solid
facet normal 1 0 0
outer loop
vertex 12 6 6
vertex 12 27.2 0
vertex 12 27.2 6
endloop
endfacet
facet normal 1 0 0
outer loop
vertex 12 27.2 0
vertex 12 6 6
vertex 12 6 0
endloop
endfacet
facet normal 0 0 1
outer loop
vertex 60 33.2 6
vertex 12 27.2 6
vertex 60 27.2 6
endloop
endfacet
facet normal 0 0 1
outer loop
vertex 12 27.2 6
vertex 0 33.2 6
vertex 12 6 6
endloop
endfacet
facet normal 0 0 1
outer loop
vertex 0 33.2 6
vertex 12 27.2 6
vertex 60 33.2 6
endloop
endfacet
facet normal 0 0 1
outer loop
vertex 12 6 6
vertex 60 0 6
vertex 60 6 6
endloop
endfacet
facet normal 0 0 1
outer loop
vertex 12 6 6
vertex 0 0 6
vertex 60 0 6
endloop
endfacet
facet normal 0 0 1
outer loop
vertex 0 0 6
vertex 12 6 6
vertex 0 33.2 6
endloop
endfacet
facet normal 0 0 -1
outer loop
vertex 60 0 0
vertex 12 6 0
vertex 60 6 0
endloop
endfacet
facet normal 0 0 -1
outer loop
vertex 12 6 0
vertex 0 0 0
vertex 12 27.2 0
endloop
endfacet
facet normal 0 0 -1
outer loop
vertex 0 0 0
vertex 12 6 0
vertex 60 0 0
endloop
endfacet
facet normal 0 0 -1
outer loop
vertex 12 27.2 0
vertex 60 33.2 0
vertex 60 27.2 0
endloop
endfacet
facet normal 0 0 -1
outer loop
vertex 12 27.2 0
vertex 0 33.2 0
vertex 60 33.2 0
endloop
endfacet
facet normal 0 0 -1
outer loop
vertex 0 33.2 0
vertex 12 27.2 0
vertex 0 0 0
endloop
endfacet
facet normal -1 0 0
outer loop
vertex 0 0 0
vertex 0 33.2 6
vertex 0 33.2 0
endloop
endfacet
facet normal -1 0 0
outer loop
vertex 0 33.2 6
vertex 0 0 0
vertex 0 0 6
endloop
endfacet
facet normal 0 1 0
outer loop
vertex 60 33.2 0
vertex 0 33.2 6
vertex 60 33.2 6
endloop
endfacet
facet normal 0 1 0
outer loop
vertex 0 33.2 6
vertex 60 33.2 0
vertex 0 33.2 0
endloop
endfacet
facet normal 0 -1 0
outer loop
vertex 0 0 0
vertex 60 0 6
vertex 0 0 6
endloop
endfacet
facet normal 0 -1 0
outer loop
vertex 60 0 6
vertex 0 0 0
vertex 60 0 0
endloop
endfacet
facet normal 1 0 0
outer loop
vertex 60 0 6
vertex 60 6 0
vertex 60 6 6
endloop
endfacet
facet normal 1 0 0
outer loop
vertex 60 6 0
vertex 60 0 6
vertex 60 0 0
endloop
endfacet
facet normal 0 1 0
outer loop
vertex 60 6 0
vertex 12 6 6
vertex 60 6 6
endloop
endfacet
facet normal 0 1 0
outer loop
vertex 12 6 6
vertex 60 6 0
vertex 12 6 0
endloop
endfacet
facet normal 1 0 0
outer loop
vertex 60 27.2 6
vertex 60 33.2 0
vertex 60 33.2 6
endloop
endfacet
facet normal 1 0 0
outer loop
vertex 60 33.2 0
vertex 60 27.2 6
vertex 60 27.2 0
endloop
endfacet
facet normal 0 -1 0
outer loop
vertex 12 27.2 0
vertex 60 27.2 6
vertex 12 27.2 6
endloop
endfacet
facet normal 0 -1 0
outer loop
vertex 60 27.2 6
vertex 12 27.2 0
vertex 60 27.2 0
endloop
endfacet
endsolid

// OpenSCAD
// QualityRelay 5.0 rebuilt print kit
// Units: millimeters
// Export one part at a time by changing `part`.
// slot_defect / tab_defect are seeded out-of-tolerance specimens that cannot fit any
// mating part in this kit (CAD interference >= 0.40 mm). They are intentional test
// specimens, not naturally occurring manufacturing defects.

part = "slot_good";

coupon_length = 60;
coupon_height = 6;
slot_base_length = 12;
slot_rail_width = 6;

module slot_coupon(inner_width) {
    outer_width = inner_width + 2 * slot_rail_width;
    union() {
        cube([slot_base_length, outer_width, coupon_height]);
        translate([slot_base_length, 0, 0])
            cube([coupon_length - slot_base_length, slot_rail_width, coupon_height]);
        translate([slot_base_length, slot_rail_width + inner_width, 0])
            cube([coupon_length - slot_base_length, slot_rail_width, coupon_height]);
    }
}

module tab_coupon(width) {
    cube([coupon_length, width, coupon_height]);
}

if (part == "slot_good") {
    slot_coupon(21.20);
} else if (part == "slot_nominal") {
    slot_coupon(21.00);
} else if (part == "slot_risk") {
    slot_coupon(20.70);
} else if (part == "tab_good") {
    tab_coupon(19.80);
} else if (part == "tab_nominal") {
    tab_coupon(20.00);
} else if (part == "tab_risk") {
    tab_coupon(20.30);
} else if (part == "slot_defect") {
    slot_coupon(19.40);
} else if (part == "tab_defect") {
    tab_coupon(21.60);
} else if (part == "repeatability_bar") {
    tab_coupon(20.00);
} else {
    assert(false, str("Unknown part: ", part));
}
